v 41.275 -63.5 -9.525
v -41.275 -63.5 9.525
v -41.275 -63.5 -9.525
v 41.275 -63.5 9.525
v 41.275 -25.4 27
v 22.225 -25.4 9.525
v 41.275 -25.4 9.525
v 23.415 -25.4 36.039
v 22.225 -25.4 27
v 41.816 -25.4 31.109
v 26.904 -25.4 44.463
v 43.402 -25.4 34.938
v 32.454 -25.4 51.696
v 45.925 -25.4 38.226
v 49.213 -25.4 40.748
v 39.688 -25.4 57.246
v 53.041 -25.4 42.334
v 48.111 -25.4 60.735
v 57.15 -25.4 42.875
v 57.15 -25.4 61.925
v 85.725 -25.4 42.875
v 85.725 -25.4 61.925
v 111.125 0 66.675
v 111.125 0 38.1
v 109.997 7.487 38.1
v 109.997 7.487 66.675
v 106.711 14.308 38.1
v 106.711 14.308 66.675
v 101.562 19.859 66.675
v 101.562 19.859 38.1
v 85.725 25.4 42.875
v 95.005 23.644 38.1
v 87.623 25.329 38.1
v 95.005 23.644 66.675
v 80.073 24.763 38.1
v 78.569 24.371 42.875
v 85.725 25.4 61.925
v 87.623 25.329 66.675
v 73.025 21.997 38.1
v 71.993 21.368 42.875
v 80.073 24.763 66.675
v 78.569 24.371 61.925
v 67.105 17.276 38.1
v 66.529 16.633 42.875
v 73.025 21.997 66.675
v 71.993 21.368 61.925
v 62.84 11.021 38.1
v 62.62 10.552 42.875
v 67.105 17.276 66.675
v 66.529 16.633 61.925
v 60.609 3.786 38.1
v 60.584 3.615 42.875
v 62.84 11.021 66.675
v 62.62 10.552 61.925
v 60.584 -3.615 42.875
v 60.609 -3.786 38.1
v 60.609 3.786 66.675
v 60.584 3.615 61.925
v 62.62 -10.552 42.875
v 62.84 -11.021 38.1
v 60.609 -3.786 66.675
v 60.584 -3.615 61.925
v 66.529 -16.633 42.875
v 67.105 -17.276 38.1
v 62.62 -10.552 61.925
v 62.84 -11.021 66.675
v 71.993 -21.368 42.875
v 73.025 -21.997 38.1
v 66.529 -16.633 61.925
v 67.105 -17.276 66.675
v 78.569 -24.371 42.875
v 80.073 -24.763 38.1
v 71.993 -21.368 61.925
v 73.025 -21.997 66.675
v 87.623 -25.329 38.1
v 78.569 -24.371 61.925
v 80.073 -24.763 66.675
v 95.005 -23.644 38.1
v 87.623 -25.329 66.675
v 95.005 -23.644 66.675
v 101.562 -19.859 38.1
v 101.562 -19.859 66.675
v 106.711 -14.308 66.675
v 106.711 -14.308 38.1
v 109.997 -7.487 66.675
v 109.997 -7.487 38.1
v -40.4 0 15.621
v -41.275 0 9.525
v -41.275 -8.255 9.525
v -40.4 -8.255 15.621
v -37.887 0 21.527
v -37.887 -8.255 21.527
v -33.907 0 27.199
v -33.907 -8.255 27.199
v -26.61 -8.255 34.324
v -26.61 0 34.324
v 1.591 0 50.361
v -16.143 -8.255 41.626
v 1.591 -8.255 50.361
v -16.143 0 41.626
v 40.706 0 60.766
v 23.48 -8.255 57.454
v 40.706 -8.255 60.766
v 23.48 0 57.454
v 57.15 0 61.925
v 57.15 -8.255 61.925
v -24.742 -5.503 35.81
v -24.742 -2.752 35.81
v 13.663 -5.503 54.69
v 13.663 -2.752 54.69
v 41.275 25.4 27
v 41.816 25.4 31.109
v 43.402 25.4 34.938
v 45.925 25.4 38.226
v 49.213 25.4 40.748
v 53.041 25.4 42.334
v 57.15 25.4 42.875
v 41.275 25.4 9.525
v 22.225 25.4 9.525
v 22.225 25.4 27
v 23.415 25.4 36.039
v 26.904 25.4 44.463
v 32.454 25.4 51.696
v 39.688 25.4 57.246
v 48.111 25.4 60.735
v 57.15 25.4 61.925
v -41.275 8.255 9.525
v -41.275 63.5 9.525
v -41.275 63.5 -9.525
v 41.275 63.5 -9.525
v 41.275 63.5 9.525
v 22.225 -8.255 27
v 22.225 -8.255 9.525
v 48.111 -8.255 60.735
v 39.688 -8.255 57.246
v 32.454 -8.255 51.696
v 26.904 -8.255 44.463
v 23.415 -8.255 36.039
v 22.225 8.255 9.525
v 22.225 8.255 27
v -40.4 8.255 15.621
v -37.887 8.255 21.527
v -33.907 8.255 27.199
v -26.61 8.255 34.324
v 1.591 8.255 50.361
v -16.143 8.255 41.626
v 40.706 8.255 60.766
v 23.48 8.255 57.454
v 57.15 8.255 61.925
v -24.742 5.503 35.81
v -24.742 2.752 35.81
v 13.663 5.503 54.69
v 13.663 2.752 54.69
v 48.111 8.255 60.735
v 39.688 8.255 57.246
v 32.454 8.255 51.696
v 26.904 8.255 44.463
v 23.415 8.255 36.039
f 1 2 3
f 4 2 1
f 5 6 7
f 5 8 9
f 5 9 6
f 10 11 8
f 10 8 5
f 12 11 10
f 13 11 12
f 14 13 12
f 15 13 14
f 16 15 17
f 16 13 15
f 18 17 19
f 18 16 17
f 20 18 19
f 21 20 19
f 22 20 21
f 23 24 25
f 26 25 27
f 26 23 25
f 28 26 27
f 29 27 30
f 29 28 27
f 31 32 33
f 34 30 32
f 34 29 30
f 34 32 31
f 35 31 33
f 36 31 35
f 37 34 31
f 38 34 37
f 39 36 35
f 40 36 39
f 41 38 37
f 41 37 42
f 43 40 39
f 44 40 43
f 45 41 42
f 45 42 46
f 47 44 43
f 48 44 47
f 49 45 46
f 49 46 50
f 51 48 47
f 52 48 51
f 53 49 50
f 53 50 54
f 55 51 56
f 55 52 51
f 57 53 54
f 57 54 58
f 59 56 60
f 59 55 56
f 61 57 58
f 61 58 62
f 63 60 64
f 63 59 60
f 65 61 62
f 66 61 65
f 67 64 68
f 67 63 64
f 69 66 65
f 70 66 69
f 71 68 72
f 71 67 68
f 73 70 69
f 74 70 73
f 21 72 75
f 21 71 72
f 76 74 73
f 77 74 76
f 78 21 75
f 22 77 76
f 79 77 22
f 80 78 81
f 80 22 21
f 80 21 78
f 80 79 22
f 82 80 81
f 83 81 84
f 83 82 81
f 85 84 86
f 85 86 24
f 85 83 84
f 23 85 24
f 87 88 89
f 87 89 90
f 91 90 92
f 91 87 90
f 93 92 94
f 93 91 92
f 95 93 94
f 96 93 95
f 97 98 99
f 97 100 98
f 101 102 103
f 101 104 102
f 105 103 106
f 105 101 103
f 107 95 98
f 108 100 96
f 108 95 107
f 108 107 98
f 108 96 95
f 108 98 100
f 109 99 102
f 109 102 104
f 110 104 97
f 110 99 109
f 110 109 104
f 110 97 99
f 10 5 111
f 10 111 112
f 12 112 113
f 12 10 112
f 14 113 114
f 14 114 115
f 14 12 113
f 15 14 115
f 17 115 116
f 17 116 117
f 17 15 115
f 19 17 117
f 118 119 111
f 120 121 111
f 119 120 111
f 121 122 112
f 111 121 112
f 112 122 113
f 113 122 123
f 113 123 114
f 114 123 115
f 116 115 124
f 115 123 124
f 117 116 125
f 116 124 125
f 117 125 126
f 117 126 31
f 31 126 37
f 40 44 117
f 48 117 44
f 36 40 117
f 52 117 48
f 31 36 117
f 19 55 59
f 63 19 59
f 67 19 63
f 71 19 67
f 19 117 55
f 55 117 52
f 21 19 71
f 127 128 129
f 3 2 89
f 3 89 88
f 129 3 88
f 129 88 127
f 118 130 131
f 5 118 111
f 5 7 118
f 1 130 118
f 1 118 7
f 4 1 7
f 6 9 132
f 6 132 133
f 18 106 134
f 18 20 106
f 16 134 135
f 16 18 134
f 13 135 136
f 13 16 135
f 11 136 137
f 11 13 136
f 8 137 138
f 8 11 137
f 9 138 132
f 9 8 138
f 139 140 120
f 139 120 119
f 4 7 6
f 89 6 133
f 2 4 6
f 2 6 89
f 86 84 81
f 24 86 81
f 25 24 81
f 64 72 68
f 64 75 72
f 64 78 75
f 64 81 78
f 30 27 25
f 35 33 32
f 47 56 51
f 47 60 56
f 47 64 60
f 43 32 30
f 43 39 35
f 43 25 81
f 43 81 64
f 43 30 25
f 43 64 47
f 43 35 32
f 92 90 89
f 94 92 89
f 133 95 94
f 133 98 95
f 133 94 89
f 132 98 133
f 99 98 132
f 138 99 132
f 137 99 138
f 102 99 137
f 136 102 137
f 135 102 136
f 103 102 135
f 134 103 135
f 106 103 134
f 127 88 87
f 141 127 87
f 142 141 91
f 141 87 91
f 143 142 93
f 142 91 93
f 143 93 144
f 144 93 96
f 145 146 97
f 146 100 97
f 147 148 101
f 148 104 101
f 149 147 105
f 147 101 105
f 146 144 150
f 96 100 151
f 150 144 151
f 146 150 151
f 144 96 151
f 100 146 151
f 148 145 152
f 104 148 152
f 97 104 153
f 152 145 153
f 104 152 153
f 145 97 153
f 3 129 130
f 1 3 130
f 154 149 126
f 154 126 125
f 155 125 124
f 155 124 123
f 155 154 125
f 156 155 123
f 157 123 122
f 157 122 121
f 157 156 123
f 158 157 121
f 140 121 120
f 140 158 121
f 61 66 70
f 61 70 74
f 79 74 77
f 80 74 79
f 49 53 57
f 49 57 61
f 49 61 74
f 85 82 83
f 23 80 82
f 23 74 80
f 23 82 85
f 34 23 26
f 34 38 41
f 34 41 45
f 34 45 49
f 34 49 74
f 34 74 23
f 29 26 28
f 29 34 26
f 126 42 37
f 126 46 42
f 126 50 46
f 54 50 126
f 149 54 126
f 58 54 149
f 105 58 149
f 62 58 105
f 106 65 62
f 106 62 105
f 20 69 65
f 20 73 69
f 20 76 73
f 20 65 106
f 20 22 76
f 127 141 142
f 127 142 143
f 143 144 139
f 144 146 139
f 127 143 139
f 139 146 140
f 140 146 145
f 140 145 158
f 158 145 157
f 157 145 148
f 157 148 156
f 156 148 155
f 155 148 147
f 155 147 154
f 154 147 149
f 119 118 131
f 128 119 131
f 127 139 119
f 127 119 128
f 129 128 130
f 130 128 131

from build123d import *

# Parameters (mm, degrees)
F1_DEPTH = 63.5
F0_W     = 25.4
F0_H     = 19.05
F2_DEPTH = 25.4
F3_DEPTH = 8.255


with BuildPart() as f1:
    # F0 (on Front) → F1 (new body, symmetric)
    with BuildSketch(Plane.XZ):
        Polygon((41.275, -9.525), (41.275, 9.525), (22.225, 9.525), (-41.275, 9.525), (-41.275, -9.525), align=None)
    extrude(amount=F1_DEPTH, both=True)

    # F0 (on Front) → F2 (join, symmetric)
    with BuildSketch(Plane.XZ):
        with BuildLine():
            Line((22.225, 9.525), (41.275, 9.525))
            Line((41.275, 9.525), (41.275, 27.0002))
            ThreePointArc((41.275, 27.0002), (45.9246798487, 38.2255201513), (57.15, 42.8752))
            Line((57.15, 42.8752), (60.325, 42.8752))
            Line((60.325, 42.8752), (60.325, 61.9252))
            Line((60.325, 61.9252), (57.15, 61.9252))
            ThreePointArc((57.15, 61.9252), (32.4542956671, 51.6959043329), (22.225, 27.0002))
            Line((22.225, 27.0002), (22.225, 9.525))
        make_face()
        with Locations((73.025, 52.4002)):
            Rectangle(F0_W, F0_H)
    extrude(amount=F2_DEPTH, both=True)

    # F0 (on Front) → F3 (join, symmetric)
    with BuildSketch(Plane.XZ):
        with BuildLine():
            Line((-41.275, 9.525), (22.225, 9.525))
            Line((22.225, 9.525), (22.225, 27.0002))
            ThreePointArc((22.225, 27.0002), (32.4542956671, 51.6959043329), (57.15, 61.9252))
            add(Edge.make_bspline(
                [(-41.275, 9.525), (-41.275, 38.1), (16.719141975, 61.9252), (57.15, 61.9252)],
                knots=[0, 0, 0, 0, 111.5045361635, 111.5045361635, 111.5045361635, 111.5045361635], degree=3))
        make_face()
    extrude(amount=F3_DEPTH, both=True)

    # F0 (on Front) → F4 (revolve)
    with BuildSketch(Plane.XZ):
        Polygon((85.725, 61.9252), (85.725, 42.8752), (85.725, 38.1), (111.125, 38.1), (111.125, 66.675), (85.725, 66.675), align=None)
    revolve(axis=Axis((85.725, 0, 52.3875), (0, 0, 1)))


solid = f1.part
